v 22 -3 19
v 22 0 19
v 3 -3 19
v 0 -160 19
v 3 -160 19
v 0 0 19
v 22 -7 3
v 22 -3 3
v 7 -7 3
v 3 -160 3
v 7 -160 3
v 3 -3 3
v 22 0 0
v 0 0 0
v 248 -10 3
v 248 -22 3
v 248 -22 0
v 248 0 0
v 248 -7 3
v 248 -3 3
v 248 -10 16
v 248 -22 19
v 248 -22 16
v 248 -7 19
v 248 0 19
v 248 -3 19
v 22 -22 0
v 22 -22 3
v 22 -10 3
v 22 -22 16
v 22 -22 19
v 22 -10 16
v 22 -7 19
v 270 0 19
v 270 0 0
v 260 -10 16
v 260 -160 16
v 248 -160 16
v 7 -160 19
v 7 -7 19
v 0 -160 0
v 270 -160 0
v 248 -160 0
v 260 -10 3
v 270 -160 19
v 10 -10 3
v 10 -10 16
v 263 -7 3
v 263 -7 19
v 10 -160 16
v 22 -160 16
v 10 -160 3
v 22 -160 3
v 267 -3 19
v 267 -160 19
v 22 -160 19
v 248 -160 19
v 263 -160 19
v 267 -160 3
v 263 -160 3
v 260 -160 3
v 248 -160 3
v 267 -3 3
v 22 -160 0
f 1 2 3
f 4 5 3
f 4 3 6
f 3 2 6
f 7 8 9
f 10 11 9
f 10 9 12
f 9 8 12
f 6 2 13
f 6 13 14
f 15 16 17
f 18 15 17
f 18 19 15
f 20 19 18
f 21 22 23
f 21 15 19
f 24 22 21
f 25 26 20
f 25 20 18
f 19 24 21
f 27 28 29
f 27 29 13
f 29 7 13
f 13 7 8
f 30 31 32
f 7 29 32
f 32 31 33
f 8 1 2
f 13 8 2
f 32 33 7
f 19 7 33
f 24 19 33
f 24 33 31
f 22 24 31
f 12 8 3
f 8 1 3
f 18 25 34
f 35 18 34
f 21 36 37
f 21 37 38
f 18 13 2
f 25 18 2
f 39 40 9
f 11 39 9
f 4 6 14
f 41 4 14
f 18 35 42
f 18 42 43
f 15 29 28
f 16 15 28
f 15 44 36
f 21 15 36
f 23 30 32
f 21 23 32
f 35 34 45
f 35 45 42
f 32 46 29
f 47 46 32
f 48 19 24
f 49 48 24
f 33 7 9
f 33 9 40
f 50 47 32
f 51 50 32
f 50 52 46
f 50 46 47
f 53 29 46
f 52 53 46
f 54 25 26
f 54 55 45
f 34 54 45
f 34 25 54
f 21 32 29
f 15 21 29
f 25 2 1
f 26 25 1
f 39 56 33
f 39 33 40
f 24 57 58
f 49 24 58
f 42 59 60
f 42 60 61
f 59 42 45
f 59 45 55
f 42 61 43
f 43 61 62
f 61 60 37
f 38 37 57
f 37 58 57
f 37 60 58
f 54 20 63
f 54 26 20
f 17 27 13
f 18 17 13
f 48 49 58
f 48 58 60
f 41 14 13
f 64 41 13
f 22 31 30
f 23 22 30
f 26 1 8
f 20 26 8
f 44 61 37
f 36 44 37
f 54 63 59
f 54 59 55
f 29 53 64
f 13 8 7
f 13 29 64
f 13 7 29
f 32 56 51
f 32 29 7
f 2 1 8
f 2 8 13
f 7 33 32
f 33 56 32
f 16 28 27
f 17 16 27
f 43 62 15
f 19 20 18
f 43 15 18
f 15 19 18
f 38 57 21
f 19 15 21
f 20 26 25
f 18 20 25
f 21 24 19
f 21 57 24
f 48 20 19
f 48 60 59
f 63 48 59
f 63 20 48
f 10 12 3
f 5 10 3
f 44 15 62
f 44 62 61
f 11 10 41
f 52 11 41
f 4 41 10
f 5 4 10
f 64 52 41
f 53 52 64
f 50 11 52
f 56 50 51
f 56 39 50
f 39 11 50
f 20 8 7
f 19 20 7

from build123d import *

# Parameters (mm, degrees)
F1_DEPTH = 160
F2_W     = 10
F2_H     = 13
F3_DEPTH = 12
F4_W     = 4
F4_H     = 16
F5_DEPTH = 3
F6_W     = 4
F6_H     = 16
F7_DEPTH = 19
F9_DEPTH = 226


with BuildPart() as f1:
    # F0 (on Front) → F1 (new body)
    with BuildSketch(Plane.XZ):
        Polygon((0, 19), (0, 0), (22, 0), (22, 3), (10, 3), (10, 16), (22, 16), (22, 19), (7, 19), (7, 3), (3, 3), (3, 19), align=None)
    extrude(amount=F1_DEPTH)

    # F2 (on face) → F3 (join, through all)
    with BuildSketch(Plane.YZ.offset(10)):
        with Locations((-5, 9.5)):
            Rectangle(F2_W, F2_H)
    extrude(amount=F3_DEPTH)

    # F4 (on face) → F5 (join)
    with BuildSketch(Plane(origin=(0, 0, 0), x_dir=(-1, 0, 0), z_dir=(0, 1, 0))):
        with Locations((-5, 11)):
            Rectangle(F4_W, F4_H)
    extrude(amount=-F5_DEPTH)

    # F6 (on face) → F7 (cut, through all)
    with BuildSketch(Plane.YZ.offset(22)):
        with Locations((-5, 11)):
            Rectangle(F6_W, F6_H)
    extrude(amount=-F7_DEPTH, mode=Mode.SUBTRACT)


with BuildPart() as f9:
    # F8 (on face) → F9 (new body)
    with BuildSketch(Plane.YZ.offset(22)):
        Polygon((0, 0), (0, 19), (-3, 19), (-3, 3), (-7, 3), (-7, 19), (-22, 19), (-22, 16), (-10, 16), (-10, 3), (-22, 3), (-22, 0), align=None)
    extrude(amount=F9_DEPTH)


with BuildPart() as f12_1:
    # F12: instance of F1
    add(f1.part.mirror(Plane.YZ.offset(135)))


solid = Compound([f1.part, f9.part, f12_1.part])
